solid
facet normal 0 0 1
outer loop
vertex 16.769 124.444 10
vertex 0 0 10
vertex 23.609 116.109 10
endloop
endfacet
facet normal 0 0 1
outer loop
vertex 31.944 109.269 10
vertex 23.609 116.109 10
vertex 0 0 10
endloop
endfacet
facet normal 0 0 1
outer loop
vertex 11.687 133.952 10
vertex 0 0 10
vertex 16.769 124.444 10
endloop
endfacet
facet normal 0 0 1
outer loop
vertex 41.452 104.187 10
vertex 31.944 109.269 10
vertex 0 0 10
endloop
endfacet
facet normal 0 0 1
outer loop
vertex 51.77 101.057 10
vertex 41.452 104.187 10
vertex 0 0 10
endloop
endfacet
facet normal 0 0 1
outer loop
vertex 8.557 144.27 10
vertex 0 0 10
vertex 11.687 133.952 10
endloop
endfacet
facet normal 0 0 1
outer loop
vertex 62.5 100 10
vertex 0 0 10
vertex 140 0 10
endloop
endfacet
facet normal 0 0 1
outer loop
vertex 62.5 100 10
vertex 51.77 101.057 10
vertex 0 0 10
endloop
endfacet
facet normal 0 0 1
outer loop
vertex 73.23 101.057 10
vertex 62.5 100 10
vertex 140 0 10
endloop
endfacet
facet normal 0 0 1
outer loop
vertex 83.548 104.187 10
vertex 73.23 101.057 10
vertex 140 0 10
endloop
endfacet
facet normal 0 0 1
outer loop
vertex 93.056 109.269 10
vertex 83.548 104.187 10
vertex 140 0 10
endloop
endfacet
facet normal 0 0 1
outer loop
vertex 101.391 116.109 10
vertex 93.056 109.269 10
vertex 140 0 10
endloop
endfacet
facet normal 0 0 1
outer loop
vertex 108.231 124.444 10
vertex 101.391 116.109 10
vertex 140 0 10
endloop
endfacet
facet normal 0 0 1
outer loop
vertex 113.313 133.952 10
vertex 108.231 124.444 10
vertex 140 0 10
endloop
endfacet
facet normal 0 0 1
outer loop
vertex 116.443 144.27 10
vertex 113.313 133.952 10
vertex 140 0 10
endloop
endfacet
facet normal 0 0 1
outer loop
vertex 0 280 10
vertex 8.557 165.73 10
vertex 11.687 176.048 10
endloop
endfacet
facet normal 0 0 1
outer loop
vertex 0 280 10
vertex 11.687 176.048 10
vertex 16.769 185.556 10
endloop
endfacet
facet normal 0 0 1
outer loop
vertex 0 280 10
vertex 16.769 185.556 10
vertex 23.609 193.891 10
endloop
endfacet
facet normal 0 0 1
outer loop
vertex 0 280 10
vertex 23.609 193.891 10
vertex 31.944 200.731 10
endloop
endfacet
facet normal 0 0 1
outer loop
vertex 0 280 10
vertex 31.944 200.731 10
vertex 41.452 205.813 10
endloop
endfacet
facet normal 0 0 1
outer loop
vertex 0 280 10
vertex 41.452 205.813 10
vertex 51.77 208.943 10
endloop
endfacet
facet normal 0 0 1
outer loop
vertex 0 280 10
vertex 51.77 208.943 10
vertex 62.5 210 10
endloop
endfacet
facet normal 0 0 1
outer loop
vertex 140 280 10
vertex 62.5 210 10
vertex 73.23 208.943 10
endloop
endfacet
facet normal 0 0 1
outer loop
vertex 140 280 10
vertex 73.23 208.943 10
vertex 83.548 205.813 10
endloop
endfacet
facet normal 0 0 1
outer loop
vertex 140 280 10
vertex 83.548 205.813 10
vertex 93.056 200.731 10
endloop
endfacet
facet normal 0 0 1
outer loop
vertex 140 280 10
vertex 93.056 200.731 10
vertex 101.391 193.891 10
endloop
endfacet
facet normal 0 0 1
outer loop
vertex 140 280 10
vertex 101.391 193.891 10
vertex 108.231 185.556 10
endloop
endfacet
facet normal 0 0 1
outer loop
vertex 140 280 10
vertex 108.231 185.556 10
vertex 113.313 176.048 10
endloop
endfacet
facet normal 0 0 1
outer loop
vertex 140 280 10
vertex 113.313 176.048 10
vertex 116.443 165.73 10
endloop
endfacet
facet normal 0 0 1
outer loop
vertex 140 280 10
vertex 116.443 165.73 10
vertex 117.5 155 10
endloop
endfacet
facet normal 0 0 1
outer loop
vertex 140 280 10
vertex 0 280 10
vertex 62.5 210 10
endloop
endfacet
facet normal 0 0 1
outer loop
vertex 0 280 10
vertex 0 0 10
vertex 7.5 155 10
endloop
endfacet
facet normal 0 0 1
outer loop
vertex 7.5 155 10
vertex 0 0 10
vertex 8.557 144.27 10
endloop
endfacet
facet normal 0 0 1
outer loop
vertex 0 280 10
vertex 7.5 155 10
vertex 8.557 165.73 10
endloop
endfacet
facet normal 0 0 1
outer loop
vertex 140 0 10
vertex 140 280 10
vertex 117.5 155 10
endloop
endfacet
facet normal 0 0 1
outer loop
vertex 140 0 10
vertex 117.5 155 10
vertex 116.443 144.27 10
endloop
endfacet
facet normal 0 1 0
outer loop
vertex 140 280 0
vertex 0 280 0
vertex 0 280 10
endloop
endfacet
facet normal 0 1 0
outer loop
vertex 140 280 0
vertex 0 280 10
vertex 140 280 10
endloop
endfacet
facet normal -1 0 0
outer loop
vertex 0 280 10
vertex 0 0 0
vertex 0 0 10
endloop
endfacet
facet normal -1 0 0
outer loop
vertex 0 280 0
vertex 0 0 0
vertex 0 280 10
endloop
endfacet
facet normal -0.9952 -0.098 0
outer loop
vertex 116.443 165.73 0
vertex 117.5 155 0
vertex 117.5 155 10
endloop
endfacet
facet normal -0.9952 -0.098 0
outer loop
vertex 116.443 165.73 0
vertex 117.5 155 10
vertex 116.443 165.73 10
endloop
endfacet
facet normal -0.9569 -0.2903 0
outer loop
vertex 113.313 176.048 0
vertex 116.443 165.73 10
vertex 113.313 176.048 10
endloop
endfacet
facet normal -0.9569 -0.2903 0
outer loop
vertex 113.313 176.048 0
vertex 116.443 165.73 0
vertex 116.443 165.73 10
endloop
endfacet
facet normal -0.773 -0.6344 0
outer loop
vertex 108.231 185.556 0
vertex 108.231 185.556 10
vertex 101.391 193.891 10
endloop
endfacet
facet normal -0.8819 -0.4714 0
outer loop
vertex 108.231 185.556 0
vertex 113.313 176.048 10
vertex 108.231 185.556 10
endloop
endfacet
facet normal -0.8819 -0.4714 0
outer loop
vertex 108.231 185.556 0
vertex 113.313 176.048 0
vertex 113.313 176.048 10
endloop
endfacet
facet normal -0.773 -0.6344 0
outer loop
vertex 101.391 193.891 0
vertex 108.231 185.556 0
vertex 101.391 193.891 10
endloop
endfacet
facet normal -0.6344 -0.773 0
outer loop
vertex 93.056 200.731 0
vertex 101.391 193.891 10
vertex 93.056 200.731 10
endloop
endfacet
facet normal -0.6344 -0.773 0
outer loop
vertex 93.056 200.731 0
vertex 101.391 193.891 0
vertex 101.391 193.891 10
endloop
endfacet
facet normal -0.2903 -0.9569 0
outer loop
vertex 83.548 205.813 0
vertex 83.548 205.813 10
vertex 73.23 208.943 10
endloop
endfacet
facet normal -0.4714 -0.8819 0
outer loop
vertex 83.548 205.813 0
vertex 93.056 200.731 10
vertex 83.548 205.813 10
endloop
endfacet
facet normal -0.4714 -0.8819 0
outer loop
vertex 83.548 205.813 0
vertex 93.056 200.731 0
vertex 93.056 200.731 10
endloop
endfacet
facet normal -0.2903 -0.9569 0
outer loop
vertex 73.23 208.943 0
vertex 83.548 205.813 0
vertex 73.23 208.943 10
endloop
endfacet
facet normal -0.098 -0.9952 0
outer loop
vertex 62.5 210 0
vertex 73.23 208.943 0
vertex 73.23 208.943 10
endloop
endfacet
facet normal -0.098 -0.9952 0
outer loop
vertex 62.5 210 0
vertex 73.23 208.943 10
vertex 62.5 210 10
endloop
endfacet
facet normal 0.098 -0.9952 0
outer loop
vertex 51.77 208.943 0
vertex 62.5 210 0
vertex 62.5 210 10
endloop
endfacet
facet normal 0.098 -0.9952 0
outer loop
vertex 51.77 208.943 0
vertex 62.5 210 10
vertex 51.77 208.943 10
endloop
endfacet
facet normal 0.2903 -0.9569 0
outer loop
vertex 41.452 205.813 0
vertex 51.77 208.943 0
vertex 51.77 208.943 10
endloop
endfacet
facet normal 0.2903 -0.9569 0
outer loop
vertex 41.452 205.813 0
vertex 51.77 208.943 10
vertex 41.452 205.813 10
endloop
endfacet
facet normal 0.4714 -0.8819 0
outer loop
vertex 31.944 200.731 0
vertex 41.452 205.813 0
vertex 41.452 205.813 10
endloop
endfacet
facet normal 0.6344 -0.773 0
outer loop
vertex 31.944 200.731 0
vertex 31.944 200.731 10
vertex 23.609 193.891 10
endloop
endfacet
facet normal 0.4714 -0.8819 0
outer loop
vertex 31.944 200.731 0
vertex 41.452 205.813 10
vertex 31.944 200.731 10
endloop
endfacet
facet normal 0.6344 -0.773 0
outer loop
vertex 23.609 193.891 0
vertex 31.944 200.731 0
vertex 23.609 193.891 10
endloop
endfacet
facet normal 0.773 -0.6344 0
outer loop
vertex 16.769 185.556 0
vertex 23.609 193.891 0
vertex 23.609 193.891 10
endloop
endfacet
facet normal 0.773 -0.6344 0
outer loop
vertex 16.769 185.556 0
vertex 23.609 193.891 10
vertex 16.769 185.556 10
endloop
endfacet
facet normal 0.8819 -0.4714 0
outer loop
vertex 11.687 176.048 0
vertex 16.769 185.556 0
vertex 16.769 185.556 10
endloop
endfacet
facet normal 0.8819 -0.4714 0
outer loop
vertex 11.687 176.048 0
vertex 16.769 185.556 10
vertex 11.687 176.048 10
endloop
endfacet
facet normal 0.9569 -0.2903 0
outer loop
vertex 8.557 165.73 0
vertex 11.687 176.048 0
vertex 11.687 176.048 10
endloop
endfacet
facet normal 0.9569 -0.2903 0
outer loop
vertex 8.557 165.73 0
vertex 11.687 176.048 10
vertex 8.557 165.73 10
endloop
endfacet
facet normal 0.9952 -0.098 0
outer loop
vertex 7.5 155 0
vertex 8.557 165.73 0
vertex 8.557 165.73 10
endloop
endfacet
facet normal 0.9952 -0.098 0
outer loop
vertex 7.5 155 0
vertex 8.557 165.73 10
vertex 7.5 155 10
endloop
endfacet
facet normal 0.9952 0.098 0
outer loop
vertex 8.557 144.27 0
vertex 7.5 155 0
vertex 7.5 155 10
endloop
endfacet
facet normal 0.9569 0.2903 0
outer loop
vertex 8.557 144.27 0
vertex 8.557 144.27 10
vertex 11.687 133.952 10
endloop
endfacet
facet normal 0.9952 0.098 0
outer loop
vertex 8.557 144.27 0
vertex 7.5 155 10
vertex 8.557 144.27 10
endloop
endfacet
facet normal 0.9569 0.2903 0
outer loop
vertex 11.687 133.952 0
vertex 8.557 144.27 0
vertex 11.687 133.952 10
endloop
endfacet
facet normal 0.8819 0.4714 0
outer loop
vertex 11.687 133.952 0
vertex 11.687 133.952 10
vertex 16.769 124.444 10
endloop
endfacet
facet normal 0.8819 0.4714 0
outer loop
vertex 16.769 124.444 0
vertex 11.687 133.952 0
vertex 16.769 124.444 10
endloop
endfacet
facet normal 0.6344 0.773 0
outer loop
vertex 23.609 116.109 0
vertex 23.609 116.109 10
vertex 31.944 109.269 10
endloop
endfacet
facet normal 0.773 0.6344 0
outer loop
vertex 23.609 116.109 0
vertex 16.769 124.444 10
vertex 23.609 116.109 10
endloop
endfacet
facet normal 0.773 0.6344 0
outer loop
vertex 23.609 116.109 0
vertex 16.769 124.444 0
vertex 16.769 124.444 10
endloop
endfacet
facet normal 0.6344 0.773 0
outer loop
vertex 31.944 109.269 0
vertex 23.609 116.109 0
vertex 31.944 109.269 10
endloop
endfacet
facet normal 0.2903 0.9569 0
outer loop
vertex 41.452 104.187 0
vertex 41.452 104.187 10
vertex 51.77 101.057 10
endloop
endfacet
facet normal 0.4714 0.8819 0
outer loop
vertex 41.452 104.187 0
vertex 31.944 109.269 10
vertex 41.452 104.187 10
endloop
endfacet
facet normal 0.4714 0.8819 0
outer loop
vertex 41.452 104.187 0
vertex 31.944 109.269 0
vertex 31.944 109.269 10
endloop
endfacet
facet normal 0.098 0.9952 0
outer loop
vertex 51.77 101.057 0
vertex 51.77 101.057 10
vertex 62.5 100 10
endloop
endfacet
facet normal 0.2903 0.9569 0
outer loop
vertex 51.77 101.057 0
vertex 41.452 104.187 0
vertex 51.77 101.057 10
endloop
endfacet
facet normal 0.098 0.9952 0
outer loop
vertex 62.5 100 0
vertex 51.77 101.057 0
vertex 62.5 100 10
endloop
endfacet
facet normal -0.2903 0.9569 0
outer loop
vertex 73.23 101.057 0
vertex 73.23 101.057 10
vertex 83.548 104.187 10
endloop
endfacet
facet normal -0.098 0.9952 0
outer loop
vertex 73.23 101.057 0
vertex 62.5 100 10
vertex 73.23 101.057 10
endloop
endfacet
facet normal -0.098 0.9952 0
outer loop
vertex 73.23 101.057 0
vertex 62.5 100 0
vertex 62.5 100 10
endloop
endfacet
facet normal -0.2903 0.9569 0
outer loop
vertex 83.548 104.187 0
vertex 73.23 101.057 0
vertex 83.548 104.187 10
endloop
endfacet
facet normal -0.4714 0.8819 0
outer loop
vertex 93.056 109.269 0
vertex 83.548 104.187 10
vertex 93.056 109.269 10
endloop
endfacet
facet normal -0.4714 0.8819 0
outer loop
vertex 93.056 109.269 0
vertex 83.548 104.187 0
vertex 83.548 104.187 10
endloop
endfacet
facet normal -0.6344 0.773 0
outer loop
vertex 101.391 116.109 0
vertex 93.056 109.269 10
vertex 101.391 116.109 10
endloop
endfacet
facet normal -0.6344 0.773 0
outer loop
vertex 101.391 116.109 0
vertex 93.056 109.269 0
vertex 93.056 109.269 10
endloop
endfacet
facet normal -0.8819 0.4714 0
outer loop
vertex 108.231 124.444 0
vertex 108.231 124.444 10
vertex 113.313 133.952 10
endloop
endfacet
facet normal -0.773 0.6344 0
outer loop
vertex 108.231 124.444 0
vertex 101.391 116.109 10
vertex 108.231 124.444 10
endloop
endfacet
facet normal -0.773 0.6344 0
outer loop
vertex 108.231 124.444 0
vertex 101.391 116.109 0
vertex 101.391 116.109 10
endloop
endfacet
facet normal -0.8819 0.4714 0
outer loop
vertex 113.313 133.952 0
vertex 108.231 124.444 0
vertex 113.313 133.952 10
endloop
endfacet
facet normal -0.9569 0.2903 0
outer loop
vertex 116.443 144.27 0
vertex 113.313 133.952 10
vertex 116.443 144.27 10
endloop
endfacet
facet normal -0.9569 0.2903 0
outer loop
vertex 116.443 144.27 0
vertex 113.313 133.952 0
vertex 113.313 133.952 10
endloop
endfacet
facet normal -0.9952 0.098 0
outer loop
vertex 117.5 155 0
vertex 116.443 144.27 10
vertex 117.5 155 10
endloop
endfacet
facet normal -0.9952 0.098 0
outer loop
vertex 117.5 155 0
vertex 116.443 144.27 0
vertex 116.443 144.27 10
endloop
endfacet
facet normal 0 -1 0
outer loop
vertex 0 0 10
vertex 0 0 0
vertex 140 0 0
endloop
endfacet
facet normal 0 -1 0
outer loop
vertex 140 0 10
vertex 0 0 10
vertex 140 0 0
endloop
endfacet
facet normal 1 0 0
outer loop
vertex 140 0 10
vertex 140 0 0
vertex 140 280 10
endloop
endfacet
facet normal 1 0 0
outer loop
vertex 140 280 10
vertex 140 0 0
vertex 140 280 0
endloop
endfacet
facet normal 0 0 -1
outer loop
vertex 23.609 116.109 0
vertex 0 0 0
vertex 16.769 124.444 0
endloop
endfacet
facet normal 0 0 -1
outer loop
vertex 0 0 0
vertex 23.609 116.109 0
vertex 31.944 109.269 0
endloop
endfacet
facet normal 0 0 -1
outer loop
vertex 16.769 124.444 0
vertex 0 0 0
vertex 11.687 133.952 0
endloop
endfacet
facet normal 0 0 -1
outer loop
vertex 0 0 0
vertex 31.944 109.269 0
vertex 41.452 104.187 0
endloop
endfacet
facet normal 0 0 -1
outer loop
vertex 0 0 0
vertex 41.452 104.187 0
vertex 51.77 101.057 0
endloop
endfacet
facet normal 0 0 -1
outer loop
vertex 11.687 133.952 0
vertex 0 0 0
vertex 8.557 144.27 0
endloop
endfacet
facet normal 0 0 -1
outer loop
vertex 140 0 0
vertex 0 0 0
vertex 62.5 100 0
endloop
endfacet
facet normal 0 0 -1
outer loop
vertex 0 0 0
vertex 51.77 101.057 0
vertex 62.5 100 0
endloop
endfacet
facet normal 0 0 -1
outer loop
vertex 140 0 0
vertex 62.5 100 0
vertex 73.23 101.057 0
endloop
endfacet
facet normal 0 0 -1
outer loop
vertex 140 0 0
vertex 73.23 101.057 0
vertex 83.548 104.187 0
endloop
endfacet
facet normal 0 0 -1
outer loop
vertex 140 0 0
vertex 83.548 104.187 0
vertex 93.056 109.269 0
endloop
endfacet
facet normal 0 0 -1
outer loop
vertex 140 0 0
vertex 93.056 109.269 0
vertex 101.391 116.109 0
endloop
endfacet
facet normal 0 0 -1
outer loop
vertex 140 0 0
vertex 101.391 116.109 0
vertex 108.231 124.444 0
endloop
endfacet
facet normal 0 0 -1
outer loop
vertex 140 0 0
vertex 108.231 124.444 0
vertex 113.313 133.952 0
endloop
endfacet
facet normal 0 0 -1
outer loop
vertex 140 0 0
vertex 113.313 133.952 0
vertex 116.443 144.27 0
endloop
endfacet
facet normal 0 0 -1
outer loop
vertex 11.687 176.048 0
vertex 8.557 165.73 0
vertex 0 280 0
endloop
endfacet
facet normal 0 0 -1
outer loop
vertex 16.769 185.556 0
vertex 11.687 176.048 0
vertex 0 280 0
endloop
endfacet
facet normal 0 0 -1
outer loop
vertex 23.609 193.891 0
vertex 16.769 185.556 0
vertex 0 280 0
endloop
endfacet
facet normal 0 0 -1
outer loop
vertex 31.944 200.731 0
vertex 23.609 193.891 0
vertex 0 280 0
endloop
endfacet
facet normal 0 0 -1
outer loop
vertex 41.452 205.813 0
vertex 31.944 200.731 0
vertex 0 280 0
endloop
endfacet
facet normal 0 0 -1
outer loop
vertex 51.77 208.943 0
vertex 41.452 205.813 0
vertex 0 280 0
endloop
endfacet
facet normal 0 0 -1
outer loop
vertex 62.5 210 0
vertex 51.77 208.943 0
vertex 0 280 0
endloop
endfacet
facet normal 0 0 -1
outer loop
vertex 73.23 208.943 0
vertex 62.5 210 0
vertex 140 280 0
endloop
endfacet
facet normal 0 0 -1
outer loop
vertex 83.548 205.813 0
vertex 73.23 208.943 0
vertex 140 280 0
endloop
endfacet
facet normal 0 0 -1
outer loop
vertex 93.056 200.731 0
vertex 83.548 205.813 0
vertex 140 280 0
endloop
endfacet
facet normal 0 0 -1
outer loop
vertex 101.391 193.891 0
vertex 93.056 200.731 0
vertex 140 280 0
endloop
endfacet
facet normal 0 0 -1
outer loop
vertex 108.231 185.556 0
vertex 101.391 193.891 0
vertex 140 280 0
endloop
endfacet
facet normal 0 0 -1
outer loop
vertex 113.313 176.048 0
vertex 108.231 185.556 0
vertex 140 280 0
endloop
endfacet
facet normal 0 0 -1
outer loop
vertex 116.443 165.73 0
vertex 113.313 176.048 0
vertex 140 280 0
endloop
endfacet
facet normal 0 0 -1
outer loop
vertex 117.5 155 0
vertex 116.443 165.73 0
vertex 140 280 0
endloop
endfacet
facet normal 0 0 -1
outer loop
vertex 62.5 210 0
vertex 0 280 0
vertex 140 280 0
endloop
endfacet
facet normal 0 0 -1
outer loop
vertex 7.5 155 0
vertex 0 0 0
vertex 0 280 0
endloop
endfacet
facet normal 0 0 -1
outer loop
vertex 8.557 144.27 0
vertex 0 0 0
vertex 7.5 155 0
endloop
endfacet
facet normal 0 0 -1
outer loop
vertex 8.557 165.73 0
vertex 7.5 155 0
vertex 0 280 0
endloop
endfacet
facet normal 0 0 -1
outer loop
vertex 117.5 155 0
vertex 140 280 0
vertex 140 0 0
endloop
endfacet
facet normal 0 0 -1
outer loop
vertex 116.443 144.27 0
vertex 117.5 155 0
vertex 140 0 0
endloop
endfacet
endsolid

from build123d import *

# Parameters (mm, degrees)
ESQUISSE1_W                  = 140
ESQUISSE1_H                  = 280
BOSS_EXTRU_1_DEPTH           = 10
ENL_V_MAT_EXTRU_1_DEPTH      = 314.209195267
ENL_V_MAT_EXTRU_1_DEPTH_BACK = 314.209195267
ESQUISSE2_R                  = 55


with BuildPart() as part:
    # Esquisse1 → Boss.-Extru.1 (new body)
    with BuildSketch(Plane.XY):
        with Locations((70, 140)):
            Rectangle(ESQUISSE1_W, ESQUISSE1_H)
    extrude(amount=BOSS_EXTRU_1_DEPTH)

    # Esquisse2 → Enlèv. mat.-Extru.1 (cut, two sides: drawn at the far end of the back side and taken through both)
    with BuildSketch(Plane.XY.offset(10).offset(-ENL_V_MAT_EXTRU_1_DEPTH_BACK)):
        with Locations((62.5, 155)):
            Circle(ESQUISSE2_R)
    extrude(amount=ENL_V_MAT_EXTRU_1_DEPTH + ENL_V_MAT_EXTRU_1_DEPTH_BACK, mode=Mode.SUBTRACT)


solid = part.part
